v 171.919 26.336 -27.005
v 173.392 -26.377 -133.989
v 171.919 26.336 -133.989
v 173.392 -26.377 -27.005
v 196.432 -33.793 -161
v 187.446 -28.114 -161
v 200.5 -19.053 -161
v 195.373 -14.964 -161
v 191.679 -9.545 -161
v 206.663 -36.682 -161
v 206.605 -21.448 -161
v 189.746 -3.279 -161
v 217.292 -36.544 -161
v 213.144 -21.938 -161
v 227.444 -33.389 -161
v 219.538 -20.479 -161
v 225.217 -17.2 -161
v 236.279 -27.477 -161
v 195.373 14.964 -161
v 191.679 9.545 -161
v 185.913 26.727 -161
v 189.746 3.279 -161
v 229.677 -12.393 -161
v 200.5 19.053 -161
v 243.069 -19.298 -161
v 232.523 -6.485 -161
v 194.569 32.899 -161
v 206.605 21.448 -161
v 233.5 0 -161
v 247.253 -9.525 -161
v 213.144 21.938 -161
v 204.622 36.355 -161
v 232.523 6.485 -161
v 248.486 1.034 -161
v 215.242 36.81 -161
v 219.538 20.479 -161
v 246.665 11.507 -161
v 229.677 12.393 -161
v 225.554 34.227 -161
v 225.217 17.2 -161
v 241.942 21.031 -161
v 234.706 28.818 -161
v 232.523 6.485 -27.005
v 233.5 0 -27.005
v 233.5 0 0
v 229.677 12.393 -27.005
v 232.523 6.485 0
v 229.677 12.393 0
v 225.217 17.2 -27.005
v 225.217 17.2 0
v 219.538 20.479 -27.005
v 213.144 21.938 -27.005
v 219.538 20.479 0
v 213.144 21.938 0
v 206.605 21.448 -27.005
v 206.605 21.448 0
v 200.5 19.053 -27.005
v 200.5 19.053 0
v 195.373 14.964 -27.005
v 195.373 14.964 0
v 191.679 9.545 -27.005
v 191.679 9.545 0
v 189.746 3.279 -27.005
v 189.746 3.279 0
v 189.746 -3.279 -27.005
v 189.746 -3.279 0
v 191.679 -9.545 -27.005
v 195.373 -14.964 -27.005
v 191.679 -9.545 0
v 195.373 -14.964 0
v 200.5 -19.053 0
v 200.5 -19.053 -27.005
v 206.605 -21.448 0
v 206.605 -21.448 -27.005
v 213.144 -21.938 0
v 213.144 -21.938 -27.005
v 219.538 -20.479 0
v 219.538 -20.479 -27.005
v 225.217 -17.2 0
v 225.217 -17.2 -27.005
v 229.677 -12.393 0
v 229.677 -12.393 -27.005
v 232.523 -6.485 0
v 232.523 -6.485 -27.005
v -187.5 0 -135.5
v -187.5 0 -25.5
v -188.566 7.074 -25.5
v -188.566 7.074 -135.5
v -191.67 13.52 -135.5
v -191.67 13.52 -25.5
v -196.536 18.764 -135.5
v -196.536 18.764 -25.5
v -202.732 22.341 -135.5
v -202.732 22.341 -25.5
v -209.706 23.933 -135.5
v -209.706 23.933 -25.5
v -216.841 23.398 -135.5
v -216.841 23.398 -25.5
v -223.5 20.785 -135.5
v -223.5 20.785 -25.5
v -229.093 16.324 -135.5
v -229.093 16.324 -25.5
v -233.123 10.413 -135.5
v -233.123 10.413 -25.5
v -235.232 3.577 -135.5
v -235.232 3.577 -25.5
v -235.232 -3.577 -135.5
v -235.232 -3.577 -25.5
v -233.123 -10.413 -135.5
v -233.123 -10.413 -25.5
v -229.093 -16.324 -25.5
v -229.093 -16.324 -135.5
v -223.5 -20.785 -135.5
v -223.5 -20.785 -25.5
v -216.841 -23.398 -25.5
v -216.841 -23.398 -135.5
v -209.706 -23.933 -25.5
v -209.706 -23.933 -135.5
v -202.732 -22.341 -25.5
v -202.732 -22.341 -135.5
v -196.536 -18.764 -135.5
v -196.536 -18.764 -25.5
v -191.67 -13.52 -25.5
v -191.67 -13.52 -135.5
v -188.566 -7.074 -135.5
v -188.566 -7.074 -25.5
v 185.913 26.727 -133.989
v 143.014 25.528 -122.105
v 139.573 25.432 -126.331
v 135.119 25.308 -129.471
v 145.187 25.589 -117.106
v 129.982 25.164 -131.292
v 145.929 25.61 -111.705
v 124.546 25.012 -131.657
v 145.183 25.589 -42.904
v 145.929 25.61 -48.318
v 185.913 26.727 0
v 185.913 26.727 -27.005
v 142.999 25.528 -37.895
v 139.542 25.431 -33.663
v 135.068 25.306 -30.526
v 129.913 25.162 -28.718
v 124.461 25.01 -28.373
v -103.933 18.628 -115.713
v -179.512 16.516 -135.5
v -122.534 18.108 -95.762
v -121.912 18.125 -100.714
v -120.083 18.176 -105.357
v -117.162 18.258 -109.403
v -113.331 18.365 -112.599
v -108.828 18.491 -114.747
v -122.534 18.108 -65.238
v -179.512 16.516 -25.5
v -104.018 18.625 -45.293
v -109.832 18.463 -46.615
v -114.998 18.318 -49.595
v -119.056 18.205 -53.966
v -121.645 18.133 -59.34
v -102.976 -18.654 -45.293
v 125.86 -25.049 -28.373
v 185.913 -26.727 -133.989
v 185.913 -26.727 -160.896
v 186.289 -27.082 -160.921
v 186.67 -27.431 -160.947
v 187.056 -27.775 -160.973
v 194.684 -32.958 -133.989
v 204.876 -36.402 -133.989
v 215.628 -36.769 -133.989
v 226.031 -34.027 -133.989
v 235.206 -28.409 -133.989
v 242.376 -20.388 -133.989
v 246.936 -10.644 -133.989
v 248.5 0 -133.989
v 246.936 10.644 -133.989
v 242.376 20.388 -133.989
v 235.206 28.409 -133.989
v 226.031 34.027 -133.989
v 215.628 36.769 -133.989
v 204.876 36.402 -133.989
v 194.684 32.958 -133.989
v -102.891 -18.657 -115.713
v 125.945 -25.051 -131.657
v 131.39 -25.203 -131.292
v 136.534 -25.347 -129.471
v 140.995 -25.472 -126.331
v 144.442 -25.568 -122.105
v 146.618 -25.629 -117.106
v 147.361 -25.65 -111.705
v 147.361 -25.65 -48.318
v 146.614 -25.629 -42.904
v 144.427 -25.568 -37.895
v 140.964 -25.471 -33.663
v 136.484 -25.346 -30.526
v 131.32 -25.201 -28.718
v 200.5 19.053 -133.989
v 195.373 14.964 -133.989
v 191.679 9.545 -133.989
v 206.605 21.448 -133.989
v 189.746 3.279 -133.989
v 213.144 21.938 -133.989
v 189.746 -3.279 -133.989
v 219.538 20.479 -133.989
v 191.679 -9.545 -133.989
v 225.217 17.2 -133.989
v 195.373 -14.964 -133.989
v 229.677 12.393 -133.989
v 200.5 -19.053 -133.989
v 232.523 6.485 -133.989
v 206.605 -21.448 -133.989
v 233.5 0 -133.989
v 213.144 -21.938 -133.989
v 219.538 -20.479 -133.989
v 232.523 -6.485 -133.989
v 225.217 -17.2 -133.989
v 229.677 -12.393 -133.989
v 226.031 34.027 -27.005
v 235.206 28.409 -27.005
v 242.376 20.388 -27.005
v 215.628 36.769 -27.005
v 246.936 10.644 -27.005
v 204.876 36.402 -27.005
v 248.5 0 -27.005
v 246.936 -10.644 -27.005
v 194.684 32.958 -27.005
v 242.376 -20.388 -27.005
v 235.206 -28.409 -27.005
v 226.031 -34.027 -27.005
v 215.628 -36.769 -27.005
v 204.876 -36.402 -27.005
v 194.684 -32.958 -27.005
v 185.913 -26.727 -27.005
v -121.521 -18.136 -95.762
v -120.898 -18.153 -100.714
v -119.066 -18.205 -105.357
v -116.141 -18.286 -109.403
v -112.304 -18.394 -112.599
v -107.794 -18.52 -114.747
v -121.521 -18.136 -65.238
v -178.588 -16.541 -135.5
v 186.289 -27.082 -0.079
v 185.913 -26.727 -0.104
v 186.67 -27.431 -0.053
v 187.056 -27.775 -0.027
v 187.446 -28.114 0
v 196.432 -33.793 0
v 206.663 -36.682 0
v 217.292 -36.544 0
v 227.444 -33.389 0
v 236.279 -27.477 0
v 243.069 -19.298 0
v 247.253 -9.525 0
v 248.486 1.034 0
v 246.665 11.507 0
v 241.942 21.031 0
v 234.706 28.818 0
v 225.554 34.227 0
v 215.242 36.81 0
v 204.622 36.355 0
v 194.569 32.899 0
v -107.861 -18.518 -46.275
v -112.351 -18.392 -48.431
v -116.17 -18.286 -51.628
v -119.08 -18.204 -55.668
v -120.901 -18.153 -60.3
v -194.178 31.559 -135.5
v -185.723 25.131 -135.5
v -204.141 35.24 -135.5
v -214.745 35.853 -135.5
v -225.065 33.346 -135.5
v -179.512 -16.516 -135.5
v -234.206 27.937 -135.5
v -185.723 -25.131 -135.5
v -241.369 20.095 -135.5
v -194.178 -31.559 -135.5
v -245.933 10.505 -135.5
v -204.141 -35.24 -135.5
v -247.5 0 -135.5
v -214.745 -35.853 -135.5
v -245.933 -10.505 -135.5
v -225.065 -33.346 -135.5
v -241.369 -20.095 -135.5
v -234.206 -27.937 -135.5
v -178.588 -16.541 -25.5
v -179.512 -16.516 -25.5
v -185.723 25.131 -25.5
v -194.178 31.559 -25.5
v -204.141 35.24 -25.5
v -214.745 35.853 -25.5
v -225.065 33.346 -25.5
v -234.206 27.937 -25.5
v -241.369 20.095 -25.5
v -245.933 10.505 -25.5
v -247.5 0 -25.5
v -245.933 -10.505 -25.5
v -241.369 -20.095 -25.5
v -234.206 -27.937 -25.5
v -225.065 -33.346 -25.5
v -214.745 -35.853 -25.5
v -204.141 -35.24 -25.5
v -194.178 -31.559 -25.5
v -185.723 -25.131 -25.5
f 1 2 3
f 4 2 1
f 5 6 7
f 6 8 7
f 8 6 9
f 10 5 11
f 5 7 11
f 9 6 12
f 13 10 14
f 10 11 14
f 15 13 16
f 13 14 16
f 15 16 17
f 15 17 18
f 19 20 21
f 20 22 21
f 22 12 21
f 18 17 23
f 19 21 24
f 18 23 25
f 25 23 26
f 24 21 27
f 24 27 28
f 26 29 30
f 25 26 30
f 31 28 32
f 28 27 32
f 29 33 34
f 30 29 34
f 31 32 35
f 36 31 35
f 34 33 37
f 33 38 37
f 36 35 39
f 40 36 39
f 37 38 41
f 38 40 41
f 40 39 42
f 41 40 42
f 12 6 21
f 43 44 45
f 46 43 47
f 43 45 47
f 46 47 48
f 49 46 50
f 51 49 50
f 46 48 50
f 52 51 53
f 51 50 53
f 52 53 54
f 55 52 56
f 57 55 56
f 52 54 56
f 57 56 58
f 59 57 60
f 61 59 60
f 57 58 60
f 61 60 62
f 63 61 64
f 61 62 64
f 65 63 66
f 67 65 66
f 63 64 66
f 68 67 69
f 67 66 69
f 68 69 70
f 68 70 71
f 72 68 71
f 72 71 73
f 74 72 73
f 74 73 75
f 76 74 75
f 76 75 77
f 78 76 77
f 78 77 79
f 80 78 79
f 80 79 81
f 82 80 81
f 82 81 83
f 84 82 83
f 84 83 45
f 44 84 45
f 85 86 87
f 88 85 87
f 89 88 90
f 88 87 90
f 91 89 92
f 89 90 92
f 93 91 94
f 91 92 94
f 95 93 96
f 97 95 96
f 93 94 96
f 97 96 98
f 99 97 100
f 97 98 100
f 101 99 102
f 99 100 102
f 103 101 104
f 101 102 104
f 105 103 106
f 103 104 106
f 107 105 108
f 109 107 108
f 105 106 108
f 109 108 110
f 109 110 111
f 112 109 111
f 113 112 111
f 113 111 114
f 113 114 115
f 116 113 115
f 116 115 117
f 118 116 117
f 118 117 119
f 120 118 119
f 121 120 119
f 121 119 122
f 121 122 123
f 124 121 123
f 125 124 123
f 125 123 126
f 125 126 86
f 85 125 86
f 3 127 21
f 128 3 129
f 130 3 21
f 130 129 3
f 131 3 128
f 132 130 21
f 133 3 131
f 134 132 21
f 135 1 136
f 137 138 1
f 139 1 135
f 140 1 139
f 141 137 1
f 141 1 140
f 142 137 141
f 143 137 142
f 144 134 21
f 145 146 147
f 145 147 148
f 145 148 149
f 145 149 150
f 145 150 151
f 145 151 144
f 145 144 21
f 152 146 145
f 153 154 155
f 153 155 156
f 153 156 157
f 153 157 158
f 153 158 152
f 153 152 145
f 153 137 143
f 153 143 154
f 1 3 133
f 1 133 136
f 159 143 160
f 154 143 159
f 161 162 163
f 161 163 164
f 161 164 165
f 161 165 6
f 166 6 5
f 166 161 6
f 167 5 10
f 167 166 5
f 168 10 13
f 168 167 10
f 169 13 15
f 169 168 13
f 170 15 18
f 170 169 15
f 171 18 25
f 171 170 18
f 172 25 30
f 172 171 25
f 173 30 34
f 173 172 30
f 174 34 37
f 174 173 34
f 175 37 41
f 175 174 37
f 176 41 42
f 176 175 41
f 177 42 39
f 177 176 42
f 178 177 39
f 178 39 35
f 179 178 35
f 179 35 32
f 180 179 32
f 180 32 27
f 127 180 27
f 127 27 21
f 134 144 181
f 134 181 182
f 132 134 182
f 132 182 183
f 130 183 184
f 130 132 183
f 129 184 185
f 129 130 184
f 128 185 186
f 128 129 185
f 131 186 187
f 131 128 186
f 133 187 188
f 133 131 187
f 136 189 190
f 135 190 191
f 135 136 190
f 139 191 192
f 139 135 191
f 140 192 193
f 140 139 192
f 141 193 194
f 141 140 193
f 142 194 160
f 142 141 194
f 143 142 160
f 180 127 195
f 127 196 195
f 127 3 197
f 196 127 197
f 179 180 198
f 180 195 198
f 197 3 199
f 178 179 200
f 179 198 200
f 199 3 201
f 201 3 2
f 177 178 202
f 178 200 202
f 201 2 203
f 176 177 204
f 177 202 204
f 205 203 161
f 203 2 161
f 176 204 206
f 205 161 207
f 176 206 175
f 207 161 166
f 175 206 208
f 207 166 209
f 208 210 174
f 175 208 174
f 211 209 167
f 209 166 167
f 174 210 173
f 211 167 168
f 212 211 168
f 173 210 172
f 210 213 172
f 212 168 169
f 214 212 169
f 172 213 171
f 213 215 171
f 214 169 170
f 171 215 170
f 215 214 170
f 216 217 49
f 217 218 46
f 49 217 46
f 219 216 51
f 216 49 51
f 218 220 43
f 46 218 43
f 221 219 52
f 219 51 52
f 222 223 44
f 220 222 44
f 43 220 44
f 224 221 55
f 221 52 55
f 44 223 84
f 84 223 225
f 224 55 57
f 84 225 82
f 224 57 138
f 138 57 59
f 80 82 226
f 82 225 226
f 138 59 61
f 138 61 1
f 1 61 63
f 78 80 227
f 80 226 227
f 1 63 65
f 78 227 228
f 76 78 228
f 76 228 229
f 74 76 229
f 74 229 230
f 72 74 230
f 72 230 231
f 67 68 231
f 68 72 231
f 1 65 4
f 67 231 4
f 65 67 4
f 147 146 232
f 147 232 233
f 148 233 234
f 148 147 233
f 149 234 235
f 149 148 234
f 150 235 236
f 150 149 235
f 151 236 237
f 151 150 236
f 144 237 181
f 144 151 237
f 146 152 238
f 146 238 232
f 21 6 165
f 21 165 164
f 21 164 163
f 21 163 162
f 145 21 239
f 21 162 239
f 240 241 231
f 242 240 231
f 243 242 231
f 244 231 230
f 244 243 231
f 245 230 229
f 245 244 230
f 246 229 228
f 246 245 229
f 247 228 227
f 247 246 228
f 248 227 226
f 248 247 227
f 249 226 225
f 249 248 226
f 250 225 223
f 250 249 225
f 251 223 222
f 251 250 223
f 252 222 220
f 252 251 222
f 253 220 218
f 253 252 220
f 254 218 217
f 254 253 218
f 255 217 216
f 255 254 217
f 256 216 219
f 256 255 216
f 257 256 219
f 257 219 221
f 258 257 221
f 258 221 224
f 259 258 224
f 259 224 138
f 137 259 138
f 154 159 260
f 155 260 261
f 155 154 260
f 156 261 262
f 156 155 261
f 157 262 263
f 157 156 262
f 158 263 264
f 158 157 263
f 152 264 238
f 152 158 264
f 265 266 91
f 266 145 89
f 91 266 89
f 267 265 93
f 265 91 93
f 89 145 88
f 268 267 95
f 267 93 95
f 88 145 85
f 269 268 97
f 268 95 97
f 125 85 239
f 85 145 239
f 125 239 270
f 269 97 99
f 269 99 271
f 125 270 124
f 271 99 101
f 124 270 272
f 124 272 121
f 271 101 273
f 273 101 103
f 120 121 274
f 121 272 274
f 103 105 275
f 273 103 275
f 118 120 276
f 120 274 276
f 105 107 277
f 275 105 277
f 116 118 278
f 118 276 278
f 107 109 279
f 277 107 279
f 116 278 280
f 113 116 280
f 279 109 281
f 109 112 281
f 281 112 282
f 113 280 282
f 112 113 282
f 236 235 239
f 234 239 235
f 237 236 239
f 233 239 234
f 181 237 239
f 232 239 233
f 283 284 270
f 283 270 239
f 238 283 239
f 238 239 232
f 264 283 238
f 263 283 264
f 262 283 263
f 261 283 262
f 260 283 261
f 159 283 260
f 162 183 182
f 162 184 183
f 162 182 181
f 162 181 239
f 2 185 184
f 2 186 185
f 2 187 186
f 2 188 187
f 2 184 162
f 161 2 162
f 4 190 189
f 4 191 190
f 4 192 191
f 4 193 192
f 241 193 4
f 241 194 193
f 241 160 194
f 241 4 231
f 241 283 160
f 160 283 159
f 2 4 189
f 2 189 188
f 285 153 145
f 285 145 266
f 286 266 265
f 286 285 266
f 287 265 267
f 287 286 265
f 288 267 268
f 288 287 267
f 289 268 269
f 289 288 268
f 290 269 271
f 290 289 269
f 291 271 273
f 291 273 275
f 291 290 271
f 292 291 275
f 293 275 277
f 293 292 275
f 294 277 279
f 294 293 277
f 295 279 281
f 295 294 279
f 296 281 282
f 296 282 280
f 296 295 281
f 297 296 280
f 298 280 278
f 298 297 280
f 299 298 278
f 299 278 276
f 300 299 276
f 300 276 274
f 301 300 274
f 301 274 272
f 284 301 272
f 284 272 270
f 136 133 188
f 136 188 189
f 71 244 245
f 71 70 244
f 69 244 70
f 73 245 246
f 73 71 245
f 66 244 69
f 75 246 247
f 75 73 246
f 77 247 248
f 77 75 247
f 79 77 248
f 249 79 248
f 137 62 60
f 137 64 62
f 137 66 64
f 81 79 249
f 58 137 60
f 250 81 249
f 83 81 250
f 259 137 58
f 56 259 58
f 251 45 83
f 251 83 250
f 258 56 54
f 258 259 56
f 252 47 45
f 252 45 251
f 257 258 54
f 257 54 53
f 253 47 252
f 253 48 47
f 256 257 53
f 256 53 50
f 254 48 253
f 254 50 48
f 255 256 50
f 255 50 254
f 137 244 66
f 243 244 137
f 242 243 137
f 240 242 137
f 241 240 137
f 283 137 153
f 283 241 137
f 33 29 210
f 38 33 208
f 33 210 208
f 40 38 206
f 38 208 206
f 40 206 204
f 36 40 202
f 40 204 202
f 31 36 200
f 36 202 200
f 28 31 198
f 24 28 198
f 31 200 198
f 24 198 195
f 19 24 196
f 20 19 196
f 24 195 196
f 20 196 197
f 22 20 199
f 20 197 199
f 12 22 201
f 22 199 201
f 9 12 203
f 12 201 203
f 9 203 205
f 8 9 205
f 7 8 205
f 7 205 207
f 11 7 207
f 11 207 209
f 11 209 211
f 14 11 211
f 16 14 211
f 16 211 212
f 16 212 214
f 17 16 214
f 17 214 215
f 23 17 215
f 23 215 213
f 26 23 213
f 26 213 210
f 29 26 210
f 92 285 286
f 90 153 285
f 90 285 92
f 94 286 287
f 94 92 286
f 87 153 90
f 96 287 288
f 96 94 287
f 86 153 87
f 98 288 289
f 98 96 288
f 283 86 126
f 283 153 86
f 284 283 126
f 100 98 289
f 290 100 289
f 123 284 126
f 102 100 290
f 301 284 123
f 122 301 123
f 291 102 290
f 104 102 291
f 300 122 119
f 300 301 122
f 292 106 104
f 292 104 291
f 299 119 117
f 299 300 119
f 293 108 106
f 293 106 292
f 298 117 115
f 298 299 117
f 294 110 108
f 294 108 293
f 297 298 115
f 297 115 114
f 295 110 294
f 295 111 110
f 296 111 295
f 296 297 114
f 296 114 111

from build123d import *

# Parameters (mm, degrees)
SKETCH1_R               = 22
SKETCH1_R_2             = 24
BOSS_EXTRUDE1_DEPTH     = 161
CUT_EXTRUDE1_DEPTH      = 161
CUT_EXTRUDE1_DEPTH_BACK = 161
CUT_EXTRUDE2_DEPTH      = 161
CUT_EXTRUDE3_DEPTH      = 161
CUT_EXTRUDE3_DEPTH_BACK = 161


with BuildPart() as part:
    # Sketch1 → Boss-Extrude1 (new body)
    with BuildSketch(Plane.XY):
        with BuildLine():
            Line((-179.511953074, -16.515594264), (185.913473281, -26.726946149))
            ThreePointArc((185.913473281, -26.726946149), (248.5, 0), (185.913473281, 26.726946149))
            Line((185.913473281, 26.726946149), (-179.511953074, 16.515594264))
            ThreePointArc((-179.511953074, 16.515594264), (-247.5, 0), (-179.511953074, -16.515594264))
        make_face()
        with Locations((211.5, 0)):
            Circle(SKETCH1_R, mode=Mode.SUBTRACT)
        with Locations((-211.5, 0)):
            Circle(SKETCH1_R_2, mode=Mode.SUBTRACT)
    extrude(amount=-BOSS_EXTRUDE1_DEPTH)

    # Sketch3 → Cut-Extrude1 (cut, two sides: drawn at the far end of the back side and taken through both)
    with BuildSketch(Plane(origin=(-0.601210303, 21.515028947, 0), x_dir=(0.9996098022907813, 0.027932833085548846, 0), z_dir=(-0.027932833085548846, 0.9996098022907813, 0)).offset(-CUT_EXTRUDE1_DEPTH_BACK)):
        Polygon((-178.980580584, 135.5), (-268.840136548, 135.5), (-268.840136548, 212.571288089), (186.587489595, 212.571288089), (186.587489595, 161), align=None)
        Polygon((-178.980580584, 25.5), (-268.840136548, 25.5), (-268.840136548, -47.637415265), (186.587489595, -47.637415265), (186.587489595, 0), align=None)
    extrude(amount=CUT_EXTRUDE1_DEPTH + CUT_EXTRUDE1_DEPTH_BACK, mode=Mode.SUBTRACT)

    # Sketch4 → Cut-Extrude2 (cut)
    with BuildSketch(Plane(origin=(-0.601210303, 21.515028947, 0), x_dir=(0.9996098022907813, 0.027932833085548846, 0), z_dir=(-0.027932833085548846, 0.9996098022907813, 0))):
        with BuildLine():
            Line((-121.980580584, 65.23825231), (-121.980580584, 95.76174769))
            ThreePointArc((-121.980580584, 95.76174769), (-116.606484769, 109.402969291), (-103.372287906, 115.713267701))
            Line((-103.372287906, 115.713267701), (125.195782273, 131.656907928))
            ThreePointArc((125.195782273, 131.656907928), (140.228711197, 126.331292103), (146.587489595, 111.705387918))
            Line((146.587489595, 111.705387918), (146.587489595, 48.31804977))
            ThreePointArc((146.587489595, 48.31804977), (140.197596355, 33.6631873), (125.110990195, 28.372625495))
            Line((125.110990195, 28.372625495), (-103.457079984, 45.292828035))
            ThreePointArc((-103.457079984, 45.292828035), (-116.635443053, 51.628145551), (-121.980580584, 65.23825231))
        make_face()
    extrude(amount=-CUT_EXTRUDE2_DEPTH, mode=Mode.SUBTRACT)

    # Sketch6 → Cut-Extrude3 (cut, two sides: drawn at the far end of the back side and taken through both)
    with BuildSketch(Plane(origin=(-0.601210303, 21.515028947, 0), x_dir=(0.9996098022907813, 0.027932833085548846, 0), z_dir=(-0.027932833085548846, 0.9996098022907813, 0)).offset(-CUT_EXTRUDE3_DEPTH_BACK)):
        Polygon((172.587489595, 80.011718844), (172.587489595, 133.988681084), (279.945964302, 133.988681084), (279.945964302, 27.005225925), (172.587489595, 27.005225925), align=None)
    extrude(amount=CUT_EXTRUDE3_DEPTH + CUT_EXTRUDE3_DEPTH_BACK, mode=Mode.SUBTRACT)


solid = part.part
